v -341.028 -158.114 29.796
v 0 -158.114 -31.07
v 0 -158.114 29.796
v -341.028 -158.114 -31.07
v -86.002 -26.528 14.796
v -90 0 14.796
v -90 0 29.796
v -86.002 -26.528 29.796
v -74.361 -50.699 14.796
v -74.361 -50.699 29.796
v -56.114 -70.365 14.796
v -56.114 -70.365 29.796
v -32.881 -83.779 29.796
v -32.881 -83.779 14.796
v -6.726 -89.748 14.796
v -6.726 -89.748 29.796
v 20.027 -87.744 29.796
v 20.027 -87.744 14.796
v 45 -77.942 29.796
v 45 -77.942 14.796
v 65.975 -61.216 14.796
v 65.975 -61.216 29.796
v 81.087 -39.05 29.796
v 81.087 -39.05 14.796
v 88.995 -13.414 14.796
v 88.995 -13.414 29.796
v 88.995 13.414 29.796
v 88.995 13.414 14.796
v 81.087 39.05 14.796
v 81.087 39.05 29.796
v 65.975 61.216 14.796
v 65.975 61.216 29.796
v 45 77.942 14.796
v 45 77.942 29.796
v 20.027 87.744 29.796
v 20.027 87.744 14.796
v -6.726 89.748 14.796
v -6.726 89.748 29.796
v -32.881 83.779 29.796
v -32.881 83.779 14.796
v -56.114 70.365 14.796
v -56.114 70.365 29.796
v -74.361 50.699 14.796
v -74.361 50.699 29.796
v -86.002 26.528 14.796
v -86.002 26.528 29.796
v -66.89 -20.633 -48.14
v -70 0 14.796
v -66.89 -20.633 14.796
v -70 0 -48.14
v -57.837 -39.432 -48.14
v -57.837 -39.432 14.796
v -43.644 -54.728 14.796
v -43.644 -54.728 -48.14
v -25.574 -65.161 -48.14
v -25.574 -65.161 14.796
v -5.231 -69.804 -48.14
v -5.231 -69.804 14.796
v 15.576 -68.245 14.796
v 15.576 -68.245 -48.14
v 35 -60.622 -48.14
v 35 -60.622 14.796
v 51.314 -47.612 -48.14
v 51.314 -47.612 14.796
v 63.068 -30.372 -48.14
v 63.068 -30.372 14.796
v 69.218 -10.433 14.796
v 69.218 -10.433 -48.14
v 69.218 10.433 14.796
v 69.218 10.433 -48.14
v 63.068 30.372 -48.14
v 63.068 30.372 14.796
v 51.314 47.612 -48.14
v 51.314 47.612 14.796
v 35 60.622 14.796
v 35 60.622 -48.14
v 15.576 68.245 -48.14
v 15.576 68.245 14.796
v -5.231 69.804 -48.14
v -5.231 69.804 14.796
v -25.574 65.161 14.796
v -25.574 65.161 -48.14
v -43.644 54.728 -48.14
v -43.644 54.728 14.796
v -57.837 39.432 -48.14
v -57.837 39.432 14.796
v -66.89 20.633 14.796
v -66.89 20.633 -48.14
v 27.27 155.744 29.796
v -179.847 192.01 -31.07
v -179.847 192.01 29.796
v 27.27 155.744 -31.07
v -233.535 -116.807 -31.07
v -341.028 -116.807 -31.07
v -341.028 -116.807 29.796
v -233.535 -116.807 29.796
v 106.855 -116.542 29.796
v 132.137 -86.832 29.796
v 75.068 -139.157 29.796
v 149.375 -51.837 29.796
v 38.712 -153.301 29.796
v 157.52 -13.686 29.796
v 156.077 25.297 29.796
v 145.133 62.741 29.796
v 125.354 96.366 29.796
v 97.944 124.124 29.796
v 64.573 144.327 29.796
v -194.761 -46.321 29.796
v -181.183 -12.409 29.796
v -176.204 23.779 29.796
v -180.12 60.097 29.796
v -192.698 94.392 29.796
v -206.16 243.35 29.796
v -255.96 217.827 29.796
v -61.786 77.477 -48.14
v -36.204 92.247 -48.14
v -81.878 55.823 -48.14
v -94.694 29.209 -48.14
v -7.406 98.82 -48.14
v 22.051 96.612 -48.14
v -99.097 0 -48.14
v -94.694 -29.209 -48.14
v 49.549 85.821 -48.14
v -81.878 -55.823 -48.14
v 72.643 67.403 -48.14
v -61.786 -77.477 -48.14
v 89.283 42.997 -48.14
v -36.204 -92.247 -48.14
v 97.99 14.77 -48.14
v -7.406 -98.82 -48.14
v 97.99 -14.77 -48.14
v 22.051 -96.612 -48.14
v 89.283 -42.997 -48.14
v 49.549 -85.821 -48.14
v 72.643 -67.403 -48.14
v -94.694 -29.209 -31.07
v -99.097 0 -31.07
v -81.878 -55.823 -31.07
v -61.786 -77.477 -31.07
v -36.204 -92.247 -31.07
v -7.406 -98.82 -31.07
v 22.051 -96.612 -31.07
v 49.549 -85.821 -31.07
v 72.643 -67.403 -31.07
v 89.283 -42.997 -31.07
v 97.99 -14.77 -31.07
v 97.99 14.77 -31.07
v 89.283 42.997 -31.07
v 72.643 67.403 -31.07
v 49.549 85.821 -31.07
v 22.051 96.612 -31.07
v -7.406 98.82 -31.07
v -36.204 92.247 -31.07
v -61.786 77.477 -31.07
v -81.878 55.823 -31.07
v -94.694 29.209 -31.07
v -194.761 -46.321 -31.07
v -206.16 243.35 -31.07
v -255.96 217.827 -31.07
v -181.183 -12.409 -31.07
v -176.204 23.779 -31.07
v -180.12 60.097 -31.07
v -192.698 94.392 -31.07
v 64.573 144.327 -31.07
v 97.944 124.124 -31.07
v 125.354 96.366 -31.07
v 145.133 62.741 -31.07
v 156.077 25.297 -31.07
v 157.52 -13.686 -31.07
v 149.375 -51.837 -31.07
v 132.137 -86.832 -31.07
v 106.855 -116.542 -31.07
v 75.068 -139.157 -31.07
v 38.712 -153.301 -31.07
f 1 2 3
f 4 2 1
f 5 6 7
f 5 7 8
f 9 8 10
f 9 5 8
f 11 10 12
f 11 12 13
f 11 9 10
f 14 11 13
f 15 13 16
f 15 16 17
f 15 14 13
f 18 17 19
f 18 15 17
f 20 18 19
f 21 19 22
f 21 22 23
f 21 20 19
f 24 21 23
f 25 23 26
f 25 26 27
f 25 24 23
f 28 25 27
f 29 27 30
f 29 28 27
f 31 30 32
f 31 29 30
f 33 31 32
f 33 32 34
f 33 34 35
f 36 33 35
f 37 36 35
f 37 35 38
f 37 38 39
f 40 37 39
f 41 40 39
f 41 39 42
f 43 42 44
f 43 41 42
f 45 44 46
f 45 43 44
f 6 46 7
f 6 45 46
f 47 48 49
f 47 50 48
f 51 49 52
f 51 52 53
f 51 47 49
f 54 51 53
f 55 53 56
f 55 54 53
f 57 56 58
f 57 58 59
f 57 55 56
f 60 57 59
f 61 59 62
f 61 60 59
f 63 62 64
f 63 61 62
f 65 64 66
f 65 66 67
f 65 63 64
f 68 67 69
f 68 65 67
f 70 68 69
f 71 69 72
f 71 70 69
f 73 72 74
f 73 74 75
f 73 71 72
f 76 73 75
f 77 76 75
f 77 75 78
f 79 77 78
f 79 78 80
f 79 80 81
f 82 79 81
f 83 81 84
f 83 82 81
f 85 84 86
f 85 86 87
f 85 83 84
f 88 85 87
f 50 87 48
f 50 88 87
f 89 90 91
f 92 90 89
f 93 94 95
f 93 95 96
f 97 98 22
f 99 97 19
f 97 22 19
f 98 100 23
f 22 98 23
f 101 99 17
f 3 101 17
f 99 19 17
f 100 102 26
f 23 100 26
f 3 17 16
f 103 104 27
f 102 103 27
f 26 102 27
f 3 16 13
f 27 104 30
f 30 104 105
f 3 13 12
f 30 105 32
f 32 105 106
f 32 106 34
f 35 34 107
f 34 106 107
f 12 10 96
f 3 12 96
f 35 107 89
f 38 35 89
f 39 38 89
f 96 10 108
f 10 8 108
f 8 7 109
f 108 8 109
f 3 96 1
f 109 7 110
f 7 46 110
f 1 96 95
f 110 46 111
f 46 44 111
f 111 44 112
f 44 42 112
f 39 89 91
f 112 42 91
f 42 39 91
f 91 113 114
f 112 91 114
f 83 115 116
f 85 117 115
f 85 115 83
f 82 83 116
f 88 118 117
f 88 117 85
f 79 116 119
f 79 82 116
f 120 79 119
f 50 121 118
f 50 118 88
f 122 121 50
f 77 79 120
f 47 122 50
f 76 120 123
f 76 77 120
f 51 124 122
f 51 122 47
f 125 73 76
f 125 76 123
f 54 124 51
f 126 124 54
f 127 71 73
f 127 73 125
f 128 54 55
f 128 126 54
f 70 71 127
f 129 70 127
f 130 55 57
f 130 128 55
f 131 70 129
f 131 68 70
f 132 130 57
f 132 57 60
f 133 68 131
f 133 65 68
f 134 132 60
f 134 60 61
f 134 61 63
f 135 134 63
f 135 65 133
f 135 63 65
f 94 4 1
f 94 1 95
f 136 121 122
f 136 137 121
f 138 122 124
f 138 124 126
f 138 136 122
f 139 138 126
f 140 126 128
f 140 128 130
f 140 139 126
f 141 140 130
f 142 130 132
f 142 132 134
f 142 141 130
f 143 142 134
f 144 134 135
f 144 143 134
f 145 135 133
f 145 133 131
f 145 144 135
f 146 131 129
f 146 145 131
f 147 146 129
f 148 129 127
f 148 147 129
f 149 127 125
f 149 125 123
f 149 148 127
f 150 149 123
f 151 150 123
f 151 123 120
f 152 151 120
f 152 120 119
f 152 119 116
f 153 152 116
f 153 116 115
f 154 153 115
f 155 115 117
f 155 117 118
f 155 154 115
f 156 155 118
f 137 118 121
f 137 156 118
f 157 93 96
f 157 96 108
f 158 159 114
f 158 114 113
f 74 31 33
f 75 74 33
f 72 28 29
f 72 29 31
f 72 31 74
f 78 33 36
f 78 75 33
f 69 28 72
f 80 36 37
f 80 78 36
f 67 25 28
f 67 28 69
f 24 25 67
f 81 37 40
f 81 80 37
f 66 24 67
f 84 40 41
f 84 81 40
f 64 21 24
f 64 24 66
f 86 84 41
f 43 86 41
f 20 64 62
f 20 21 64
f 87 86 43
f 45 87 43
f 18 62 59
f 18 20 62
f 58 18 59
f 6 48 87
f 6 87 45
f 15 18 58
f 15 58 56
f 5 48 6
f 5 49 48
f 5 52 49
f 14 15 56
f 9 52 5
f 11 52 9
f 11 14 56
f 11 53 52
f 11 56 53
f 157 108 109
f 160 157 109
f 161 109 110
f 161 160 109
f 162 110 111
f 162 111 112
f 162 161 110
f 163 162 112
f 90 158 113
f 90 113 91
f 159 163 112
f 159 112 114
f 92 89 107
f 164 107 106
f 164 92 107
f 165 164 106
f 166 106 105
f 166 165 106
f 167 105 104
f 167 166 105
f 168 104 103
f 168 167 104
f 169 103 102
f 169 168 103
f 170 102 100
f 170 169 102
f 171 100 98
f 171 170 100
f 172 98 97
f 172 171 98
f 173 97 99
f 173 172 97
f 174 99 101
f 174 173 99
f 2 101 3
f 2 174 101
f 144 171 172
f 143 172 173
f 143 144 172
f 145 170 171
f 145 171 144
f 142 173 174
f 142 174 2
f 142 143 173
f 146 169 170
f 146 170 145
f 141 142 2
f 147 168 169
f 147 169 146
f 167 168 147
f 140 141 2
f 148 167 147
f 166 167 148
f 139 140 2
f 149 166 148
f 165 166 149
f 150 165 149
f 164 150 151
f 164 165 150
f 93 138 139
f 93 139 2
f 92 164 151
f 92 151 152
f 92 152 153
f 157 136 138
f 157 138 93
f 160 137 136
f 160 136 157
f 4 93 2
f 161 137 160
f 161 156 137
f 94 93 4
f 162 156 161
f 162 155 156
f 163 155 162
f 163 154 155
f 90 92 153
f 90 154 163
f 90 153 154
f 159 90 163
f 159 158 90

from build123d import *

# Parameters (mm, degrees)
SKETCH2_R           = 90
BOSS_EXTRUDE1_DEPTH = 60.865268403


with BuildPart() as part:
    # Sketch1 → Revolve1 (revolve)
    with BuildSketch(Plane(origin=(0, 0, 0), x_dir=(1, 0, 0), z_dir=(0, 1, 0))):
        Polygon((-90, -29.79575879), (-90, -14.79575879), (-70, -14.79575879), (-70, 48.140410311), (-99.097023169, 48.140410311), (-99.097023169, 31.069509613), (-158.113565582, 31.069509613), (-158.113565582, -29.79575879), align=None)
    revolve(axis=Axis((0, 0, 0), (0, 0, 1)))

    # Sketch2 → Boss-Extrude1 (add)
    with BuildSketch(Plane(origin=(0, 0, -31.069509613), x_dir=(-1, 0, 0), z_dir=(0, 0, -1))):
        with BuildLine():
            Line((0, -158.113565582), (341.027566012, -158.113565582))
            Line((341.027566012, -158.113565582), (341.027566012, -116.806868092))
            Line((341.027566012, -116.806868092), (233.535117418, -116.806868092))
            Line((233.535117418, -116.806868092), (194.760807878, -46.320749515))
            ThreePointArc((194.760807878, -46.320749515), (176.203837582, 23.778561234), (192.69826547, 94.391650408))
            Line((192.69826547, 94.391650408), (255.959925105, 217.8266932))
            Line((255.959925105, 217.8266932), (206.159608852, 243.349839506))
            Line((206.159608852, 243.349839506), (179.847269567, 192.009663729))
            Line((179.847269567, 192.009663729), (-27.270239804, 155.744128756))
            ThreePointArc((-27.270239804, 155.744128756), (-157.520092587, -13.686491605), (0, -158.113565582))
        make_face()
        Circle(SKETCH2_R, mode=Mode.SUBTRACT)
    extrude(amount=-BOSS_EXTRUDE1_DEPTH)


solid = part.part
